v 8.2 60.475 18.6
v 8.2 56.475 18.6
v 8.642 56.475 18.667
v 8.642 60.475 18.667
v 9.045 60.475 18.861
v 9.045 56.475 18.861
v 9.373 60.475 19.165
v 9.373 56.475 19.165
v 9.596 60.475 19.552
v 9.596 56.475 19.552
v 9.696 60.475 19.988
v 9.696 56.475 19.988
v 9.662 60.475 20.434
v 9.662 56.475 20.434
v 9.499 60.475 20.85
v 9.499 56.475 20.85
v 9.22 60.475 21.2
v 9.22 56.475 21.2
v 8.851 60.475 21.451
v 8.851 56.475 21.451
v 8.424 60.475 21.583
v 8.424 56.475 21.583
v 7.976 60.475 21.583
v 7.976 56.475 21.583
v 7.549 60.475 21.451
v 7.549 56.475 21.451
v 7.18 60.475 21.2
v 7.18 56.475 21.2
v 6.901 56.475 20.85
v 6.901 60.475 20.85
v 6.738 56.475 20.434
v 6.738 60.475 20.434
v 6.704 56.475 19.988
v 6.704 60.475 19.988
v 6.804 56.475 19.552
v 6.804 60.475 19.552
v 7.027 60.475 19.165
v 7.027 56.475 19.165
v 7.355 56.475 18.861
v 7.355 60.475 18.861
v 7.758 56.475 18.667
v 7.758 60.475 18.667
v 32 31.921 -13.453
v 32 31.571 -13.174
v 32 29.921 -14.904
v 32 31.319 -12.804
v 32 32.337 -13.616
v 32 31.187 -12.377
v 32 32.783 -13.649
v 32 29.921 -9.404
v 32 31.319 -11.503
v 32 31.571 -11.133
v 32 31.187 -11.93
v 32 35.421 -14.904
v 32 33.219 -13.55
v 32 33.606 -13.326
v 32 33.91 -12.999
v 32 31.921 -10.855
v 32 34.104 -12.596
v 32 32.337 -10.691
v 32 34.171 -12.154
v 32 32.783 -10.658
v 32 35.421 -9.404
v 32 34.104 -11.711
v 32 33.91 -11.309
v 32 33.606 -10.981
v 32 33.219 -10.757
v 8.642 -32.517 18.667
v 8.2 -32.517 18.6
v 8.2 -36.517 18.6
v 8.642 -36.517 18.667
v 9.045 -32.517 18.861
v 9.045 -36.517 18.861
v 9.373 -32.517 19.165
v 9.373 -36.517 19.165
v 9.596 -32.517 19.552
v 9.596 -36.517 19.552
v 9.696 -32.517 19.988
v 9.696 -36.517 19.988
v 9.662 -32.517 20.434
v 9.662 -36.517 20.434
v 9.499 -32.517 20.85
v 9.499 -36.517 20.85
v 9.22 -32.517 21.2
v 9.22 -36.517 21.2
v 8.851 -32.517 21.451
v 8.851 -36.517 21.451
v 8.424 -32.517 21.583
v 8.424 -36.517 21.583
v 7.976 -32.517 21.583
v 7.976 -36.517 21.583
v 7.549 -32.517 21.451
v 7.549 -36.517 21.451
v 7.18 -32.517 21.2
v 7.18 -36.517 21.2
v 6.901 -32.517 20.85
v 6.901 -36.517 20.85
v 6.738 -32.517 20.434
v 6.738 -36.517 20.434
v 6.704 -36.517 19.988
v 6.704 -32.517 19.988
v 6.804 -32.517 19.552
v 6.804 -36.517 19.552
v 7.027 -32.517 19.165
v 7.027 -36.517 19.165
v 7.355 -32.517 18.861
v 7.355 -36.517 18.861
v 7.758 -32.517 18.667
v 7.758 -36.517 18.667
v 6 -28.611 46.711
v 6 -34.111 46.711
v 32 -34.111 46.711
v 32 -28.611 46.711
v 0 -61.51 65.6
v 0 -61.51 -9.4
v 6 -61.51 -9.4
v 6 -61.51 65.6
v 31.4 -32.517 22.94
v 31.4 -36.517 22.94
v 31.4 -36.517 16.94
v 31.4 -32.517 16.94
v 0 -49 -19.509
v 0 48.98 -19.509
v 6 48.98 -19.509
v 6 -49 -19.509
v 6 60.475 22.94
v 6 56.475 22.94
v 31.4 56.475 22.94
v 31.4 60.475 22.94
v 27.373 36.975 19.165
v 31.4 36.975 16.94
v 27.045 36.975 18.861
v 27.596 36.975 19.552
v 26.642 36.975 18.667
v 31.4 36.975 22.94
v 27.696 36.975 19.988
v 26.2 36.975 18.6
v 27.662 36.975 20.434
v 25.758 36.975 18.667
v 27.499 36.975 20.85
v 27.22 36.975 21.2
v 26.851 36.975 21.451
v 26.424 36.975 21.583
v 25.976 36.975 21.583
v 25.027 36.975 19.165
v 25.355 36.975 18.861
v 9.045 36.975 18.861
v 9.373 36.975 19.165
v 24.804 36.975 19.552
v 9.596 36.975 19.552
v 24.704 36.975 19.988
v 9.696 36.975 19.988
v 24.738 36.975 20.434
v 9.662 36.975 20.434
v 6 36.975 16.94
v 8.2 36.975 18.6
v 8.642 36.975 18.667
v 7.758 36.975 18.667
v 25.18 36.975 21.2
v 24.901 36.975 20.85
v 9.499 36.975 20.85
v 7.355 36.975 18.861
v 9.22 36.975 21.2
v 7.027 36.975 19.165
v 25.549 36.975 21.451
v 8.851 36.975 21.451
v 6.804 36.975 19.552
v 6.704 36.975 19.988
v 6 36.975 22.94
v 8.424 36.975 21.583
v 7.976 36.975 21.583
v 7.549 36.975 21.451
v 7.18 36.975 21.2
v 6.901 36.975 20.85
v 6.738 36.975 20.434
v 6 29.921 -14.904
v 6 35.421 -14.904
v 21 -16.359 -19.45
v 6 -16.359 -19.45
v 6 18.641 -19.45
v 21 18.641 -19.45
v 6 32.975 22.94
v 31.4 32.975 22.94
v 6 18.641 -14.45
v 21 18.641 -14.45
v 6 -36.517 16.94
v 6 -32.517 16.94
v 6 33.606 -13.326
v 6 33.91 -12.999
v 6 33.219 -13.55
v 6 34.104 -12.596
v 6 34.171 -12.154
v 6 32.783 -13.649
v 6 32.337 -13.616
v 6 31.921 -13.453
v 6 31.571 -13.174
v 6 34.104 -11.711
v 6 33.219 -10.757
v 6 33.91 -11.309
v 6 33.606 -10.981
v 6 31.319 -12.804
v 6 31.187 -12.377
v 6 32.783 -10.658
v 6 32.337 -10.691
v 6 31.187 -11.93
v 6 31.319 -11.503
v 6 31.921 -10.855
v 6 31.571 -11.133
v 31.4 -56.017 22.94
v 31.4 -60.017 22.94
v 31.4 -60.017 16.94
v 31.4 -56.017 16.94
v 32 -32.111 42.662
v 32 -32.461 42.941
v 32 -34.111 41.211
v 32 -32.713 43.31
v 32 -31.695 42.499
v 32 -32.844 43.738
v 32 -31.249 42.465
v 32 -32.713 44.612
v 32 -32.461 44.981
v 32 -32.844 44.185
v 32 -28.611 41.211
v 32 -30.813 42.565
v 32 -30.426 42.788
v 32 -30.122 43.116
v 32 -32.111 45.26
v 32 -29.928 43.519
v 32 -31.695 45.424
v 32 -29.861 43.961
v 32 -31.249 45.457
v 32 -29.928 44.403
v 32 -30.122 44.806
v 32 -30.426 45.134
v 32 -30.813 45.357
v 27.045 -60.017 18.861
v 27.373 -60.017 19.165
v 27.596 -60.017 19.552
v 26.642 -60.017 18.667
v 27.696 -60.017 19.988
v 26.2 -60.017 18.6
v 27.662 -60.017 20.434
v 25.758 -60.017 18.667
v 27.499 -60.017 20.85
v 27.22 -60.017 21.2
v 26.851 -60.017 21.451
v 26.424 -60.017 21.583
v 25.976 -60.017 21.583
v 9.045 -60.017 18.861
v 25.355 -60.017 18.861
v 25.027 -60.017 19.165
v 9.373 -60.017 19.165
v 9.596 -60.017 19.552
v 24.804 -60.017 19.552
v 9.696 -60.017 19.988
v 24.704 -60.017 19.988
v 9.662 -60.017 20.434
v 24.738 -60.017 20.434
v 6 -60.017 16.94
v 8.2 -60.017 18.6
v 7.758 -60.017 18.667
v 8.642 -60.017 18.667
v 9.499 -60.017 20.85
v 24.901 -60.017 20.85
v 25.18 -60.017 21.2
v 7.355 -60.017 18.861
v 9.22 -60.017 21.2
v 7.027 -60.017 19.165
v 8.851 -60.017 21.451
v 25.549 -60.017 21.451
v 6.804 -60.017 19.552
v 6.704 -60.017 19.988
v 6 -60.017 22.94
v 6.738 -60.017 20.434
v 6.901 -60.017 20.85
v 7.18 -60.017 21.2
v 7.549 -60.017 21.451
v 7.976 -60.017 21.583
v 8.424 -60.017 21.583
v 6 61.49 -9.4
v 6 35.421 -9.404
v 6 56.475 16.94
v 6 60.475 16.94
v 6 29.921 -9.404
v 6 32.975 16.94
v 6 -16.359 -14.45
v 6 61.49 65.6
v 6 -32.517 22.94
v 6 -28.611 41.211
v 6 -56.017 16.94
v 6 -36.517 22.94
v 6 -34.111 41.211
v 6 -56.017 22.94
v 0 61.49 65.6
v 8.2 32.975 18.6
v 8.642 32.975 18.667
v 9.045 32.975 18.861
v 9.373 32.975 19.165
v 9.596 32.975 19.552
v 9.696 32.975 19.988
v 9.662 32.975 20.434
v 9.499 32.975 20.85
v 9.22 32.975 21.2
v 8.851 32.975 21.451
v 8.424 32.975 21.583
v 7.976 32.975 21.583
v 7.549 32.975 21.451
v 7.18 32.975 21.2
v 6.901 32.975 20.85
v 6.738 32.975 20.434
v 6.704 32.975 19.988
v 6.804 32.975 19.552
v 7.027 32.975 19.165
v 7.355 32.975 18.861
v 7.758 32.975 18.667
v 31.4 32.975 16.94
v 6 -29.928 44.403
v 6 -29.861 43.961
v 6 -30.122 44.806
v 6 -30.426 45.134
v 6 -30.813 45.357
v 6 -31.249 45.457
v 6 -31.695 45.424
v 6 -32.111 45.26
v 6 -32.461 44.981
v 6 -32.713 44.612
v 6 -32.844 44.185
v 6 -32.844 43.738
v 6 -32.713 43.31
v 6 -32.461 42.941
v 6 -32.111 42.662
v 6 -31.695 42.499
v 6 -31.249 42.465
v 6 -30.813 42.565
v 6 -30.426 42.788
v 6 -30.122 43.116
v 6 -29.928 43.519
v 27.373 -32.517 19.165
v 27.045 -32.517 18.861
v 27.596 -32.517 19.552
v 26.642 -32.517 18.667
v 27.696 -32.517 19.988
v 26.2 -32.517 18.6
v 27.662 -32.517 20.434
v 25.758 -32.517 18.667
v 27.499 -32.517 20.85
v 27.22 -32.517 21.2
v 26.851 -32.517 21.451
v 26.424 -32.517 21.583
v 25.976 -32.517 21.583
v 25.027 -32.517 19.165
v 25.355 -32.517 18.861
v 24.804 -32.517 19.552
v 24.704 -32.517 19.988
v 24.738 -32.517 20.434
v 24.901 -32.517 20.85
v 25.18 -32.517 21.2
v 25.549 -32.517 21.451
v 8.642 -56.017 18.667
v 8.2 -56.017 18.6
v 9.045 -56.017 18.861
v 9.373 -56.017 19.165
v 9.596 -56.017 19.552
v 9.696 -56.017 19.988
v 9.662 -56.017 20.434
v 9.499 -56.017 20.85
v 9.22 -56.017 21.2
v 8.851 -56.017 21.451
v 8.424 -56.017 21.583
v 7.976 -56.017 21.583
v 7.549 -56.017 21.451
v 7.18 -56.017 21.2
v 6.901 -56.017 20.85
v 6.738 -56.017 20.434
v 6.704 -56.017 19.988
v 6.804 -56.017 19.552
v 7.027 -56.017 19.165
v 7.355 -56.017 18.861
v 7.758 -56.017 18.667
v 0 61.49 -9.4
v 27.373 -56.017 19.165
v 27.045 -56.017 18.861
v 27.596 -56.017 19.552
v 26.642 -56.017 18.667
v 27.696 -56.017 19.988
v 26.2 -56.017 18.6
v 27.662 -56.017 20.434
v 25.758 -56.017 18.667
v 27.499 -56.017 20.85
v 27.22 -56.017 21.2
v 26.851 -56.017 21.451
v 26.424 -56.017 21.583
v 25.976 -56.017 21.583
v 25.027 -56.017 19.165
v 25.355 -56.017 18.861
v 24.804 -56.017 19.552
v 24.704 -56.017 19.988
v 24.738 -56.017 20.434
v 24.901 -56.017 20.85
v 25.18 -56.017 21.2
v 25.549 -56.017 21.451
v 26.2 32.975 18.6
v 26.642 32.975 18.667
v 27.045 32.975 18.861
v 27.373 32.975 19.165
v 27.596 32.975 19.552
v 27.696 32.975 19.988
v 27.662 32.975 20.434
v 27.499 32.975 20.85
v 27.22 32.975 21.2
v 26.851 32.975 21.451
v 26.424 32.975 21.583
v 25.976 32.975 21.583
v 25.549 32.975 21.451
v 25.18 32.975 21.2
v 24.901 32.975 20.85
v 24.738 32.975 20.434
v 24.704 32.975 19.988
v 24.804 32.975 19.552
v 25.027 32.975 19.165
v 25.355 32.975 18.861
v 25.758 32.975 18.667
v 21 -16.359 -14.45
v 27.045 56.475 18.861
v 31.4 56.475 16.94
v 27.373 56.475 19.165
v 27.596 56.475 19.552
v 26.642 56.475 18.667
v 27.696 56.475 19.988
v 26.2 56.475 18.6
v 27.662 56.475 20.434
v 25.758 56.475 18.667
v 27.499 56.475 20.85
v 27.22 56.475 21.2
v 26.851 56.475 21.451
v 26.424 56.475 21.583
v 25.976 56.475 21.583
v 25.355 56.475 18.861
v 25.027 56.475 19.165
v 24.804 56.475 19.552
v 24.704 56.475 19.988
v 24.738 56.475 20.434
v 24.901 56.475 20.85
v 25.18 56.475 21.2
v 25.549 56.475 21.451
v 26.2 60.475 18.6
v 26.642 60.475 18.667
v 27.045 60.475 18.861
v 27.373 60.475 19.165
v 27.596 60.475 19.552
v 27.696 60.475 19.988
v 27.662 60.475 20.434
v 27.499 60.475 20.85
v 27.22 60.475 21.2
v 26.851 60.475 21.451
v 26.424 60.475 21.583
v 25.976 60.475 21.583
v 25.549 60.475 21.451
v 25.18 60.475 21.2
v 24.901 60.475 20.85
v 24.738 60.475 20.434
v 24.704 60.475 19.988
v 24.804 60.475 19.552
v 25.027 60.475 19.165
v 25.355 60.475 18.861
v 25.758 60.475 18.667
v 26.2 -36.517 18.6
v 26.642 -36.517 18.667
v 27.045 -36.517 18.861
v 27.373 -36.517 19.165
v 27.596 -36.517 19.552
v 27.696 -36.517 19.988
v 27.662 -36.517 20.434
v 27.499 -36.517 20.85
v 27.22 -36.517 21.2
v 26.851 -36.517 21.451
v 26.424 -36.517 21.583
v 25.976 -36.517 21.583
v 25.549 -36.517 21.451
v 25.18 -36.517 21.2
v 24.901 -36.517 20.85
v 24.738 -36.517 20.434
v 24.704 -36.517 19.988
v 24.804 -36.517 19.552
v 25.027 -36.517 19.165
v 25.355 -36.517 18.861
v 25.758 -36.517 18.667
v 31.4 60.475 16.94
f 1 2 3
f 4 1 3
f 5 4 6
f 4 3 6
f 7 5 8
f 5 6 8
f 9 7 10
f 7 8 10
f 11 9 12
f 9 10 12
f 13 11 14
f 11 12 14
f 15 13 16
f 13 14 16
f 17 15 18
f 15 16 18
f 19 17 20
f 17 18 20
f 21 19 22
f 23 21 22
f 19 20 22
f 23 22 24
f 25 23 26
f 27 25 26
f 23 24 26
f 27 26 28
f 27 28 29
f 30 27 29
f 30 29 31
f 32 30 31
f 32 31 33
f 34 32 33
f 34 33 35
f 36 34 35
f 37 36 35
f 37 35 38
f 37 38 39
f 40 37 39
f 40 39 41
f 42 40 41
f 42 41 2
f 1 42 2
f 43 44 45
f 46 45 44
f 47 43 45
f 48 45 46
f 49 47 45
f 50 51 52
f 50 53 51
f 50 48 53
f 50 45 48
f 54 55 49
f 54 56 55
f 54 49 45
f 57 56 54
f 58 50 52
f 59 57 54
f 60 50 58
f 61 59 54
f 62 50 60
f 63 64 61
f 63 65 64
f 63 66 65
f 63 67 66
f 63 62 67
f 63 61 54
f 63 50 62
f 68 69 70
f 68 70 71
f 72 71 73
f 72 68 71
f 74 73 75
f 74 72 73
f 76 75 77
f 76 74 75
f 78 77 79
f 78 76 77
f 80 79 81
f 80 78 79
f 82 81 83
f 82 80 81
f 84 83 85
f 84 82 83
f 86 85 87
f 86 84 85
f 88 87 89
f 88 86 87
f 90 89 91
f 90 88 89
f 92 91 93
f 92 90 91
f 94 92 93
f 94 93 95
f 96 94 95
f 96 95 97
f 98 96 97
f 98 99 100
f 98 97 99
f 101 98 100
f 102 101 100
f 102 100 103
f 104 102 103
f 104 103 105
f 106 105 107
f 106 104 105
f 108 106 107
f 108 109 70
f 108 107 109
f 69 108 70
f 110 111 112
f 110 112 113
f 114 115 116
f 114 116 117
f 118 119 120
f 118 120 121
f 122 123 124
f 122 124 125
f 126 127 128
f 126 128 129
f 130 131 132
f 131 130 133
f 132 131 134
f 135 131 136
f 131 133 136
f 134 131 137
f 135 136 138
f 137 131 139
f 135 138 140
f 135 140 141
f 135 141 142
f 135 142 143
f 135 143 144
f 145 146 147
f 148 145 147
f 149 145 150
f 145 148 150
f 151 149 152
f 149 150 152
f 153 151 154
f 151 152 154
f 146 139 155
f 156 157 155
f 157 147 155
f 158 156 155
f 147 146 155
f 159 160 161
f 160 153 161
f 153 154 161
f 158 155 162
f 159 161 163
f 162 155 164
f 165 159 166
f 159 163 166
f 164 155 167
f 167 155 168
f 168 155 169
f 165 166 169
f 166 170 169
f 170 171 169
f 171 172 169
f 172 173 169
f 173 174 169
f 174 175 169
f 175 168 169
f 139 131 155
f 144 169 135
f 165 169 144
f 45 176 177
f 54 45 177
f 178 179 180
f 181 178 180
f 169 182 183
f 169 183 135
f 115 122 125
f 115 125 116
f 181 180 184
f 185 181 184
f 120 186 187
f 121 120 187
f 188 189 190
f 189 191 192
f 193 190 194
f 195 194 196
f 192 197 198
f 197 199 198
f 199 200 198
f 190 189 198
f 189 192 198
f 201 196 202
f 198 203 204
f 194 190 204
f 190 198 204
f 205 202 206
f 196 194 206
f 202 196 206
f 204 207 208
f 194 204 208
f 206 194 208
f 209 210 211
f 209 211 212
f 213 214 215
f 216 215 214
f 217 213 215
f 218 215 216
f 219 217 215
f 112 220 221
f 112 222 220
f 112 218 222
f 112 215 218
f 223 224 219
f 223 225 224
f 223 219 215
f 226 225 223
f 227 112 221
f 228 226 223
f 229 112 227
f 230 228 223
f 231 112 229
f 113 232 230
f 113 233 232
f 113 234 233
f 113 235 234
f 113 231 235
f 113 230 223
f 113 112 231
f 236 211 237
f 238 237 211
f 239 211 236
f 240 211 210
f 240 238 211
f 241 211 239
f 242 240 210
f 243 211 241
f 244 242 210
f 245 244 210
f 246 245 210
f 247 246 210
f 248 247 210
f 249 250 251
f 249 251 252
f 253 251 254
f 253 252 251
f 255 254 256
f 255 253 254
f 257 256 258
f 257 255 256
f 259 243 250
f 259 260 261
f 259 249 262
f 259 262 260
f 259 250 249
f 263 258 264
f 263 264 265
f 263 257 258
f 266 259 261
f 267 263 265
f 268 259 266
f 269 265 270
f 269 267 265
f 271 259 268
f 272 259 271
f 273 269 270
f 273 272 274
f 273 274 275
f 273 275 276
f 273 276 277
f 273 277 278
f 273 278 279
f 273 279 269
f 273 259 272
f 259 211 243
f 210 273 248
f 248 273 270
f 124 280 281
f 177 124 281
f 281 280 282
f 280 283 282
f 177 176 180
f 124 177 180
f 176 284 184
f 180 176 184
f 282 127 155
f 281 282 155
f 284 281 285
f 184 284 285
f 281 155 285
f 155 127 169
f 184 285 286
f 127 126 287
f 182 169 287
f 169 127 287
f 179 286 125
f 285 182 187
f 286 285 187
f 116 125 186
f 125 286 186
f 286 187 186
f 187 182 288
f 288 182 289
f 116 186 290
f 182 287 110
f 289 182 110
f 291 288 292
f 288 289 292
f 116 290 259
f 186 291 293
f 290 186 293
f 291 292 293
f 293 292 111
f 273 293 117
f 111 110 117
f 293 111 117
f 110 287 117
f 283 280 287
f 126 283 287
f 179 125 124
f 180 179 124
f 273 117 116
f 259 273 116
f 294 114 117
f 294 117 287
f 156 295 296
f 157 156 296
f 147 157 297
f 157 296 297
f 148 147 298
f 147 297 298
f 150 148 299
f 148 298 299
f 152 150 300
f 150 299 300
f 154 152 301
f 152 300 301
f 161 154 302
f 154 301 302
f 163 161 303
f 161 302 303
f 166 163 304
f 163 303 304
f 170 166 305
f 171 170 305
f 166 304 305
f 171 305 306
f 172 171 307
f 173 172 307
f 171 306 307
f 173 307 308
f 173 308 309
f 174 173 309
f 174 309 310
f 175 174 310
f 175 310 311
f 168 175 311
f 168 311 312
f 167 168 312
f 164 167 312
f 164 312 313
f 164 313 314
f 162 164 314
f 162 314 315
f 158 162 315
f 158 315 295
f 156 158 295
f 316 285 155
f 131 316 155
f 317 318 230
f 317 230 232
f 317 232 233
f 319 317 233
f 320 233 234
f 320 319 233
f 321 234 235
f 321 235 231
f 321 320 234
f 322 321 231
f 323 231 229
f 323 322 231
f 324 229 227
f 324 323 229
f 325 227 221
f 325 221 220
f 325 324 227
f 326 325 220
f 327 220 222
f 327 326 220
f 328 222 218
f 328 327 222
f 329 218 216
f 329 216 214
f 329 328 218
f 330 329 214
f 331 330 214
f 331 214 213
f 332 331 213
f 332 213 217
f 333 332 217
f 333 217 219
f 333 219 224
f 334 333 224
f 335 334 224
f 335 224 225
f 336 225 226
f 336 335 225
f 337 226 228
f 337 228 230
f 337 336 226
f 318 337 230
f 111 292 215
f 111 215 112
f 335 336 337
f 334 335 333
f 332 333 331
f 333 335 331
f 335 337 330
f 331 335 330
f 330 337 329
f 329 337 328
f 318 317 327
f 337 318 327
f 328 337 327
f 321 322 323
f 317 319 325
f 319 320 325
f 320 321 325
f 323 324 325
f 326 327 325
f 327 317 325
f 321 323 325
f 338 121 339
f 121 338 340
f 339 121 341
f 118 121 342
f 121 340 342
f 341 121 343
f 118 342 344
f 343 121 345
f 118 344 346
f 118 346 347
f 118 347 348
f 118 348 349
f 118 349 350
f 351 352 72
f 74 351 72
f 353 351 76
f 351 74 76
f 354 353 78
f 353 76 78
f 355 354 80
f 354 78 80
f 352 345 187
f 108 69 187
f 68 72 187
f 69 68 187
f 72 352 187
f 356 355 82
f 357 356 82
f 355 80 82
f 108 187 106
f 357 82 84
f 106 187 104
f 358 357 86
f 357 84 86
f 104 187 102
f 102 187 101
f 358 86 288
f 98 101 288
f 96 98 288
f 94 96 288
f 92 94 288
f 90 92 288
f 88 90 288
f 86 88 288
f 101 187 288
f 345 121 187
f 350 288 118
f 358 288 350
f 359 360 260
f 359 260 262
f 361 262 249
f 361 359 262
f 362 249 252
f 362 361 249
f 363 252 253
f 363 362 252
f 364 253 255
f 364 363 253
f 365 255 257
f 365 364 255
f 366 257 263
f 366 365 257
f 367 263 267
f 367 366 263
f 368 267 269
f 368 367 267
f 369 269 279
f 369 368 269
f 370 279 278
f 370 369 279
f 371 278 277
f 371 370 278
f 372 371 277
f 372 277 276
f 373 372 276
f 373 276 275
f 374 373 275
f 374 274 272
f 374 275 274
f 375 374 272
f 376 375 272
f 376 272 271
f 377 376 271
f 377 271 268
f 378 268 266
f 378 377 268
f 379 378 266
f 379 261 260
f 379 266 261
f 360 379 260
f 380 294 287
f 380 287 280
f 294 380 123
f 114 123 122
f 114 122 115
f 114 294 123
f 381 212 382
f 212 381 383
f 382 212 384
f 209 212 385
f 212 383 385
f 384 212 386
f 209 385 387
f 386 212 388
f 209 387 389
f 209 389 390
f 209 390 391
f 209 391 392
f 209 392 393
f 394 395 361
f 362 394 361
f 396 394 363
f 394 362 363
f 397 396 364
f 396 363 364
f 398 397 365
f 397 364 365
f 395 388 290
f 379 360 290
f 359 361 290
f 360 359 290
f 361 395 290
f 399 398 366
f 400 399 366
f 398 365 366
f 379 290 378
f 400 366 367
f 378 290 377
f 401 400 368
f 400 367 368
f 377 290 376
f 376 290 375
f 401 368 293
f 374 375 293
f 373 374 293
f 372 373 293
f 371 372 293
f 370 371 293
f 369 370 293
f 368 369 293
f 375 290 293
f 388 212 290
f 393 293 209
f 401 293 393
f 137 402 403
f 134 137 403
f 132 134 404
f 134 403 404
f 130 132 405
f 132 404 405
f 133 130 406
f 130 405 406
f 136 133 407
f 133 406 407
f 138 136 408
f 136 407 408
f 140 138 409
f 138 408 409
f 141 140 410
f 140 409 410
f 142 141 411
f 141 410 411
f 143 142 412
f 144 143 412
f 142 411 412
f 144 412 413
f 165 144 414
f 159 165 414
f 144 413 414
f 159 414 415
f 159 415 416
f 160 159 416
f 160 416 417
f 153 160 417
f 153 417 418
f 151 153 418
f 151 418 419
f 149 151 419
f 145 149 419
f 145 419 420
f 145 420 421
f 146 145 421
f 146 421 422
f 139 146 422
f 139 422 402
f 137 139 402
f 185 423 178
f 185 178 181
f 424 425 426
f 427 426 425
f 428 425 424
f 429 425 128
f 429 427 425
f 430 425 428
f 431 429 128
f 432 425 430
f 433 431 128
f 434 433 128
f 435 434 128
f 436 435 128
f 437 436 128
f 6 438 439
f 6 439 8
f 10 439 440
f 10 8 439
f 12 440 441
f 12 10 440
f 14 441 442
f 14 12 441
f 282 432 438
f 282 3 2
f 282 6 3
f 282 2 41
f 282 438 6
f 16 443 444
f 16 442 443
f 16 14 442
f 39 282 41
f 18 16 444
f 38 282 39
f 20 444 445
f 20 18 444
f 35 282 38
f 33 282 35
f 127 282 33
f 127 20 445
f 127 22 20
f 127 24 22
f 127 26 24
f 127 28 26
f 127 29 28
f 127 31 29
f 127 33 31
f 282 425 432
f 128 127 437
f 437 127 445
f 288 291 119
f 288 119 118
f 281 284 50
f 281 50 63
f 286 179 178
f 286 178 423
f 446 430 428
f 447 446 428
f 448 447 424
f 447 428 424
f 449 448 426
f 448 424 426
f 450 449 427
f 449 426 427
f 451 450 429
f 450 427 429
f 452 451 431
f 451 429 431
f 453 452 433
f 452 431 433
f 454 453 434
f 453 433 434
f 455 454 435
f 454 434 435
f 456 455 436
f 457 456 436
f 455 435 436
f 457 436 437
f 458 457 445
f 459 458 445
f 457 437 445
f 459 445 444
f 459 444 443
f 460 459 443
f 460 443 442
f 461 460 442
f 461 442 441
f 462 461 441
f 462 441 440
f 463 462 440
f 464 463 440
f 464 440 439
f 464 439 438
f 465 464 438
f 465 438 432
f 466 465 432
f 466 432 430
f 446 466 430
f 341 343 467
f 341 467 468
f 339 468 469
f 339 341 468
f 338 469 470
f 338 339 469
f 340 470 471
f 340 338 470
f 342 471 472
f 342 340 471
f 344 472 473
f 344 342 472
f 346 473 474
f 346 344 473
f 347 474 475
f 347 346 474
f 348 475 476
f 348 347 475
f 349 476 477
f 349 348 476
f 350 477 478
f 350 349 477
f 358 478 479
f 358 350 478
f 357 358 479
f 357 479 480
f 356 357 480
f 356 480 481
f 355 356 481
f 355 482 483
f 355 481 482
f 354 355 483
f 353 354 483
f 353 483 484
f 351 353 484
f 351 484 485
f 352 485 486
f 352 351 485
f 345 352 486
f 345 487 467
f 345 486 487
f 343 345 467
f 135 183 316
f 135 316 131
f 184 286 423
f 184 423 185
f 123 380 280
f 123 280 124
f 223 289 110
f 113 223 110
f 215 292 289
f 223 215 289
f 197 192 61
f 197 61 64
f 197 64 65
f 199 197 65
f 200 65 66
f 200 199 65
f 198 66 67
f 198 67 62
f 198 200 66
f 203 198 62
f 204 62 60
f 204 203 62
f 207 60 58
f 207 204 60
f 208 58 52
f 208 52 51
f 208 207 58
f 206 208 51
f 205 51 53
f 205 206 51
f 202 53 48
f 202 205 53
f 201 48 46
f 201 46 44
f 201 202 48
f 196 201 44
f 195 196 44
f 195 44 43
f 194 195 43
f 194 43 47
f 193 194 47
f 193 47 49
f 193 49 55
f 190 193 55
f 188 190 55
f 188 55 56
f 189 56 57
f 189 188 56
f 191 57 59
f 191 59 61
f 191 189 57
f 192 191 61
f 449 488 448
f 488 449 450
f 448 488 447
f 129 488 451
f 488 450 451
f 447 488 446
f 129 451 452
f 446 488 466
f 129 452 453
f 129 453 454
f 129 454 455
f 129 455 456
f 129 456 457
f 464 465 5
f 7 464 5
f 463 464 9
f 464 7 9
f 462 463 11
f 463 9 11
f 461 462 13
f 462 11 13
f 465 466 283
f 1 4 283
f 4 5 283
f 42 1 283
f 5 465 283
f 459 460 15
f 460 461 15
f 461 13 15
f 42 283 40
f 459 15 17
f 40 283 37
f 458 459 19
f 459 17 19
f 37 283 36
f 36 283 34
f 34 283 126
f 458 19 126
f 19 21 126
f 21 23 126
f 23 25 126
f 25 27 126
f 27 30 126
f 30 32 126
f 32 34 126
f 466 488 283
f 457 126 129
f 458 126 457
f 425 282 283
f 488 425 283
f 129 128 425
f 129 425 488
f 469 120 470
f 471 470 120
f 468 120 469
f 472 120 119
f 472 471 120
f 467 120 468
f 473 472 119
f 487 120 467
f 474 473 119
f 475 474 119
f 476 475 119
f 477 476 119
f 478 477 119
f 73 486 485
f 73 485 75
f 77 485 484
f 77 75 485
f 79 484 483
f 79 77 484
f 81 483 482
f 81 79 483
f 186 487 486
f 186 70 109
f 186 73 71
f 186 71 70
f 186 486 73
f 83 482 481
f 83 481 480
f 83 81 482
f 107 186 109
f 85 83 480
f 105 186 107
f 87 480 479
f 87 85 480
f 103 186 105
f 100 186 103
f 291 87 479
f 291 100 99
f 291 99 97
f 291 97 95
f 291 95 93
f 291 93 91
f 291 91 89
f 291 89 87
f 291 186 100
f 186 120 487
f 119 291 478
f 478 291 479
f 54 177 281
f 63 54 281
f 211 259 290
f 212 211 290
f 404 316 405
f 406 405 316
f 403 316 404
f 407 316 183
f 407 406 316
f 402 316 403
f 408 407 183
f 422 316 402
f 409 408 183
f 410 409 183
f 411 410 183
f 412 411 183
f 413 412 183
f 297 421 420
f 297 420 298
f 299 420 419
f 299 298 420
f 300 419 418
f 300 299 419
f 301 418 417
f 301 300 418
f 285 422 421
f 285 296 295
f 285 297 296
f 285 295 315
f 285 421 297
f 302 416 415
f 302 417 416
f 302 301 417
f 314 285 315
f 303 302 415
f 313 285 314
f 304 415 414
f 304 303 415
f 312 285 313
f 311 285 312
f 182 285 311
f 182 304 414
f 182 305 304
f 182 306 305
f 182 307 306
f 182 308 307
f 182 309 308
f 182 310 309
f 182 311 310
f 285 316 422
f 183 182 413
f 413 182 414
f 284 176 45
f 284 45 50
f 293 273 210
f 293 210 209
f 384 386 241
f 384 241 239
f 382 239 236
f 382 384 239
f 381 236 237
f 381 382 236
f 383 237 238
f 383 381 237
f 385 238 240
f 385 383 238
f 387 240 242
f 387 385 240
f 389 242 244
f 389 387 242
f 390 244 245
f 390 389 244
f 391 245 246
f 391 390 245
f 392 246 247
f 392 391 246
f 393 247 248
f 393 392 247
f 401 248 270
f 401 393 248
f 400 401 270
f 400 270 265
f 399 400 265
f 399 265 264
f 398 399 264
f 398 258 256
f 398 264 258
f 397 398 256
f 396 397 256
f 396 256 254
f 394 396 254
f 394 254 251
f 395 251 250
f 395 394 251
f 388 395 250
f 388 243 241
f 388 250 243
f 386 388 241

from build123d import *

# Parameters (mm, degrees)
PAD_DEPTH         = 6
SKETCH001_W       = 4
SKETCH001_H       = 6
PAD001_DEPTH      = 25.4
SKETCH002_R       = 1.5
POCKET_DEPTH      = 100
POCKET_DEPTH_BACK = 100
SKETCH003_W       = 35
SKETCH003_H       = 5
PAD002_DEPTH      = 15
SKETCH012_W       = 5.5
SKETCH012_H       = 5.5
SKETCH012_R       = 1.5
PAD010_DEPTH      = 26


with BuildPart() as part:
    # Sketch → Pad (new body)
    with BuildSketch(Plane.YZ):
        Polygon((-61.51, 65.6), (61.49, 65.6), (61.49, -9.4), (48.98, -19.508726), (-49, -19.508726), (-61.51, -9.4), align=None)
    extrude(amount=PAD_DEPTH)

    # Sketch001 (on Face8 of Pad) → Pad001 (join)
    with BuildSketch(Plane.YZ.offset(6)):
        with Locations((34.974674, 19.94)):
            Rectangle(SKETCH001_W, SKETCH001_H)
        with Locations((58.474674, 19.94)):
            Rectangle(SKETCH001_W, SKETCH001_H)
        with Locations((-34.517246, 19.94)):
            Rectangle(SKETCH001_W, SKETCH001_H)
        with Locations((-58.017246, 19.94)):
            Rectangle(SKETCH001_W, SKETCH001_H)
    extrude(amount=PAD001_DEPTH)

    # Sketch002 (on Face14 of Pad001) → Pocket (cut, two sides)
    with BuildSketch(Plane(origin=(0, 32.974674, 0), x_dir=(0, 0, -1), z_dir=(0, -1, 0))) as pocket_sk:
        with Locations((-20.1, 26.2)):
            Circle(SKETCH002_R)
        with Locations((-20.1, 8.2)):
            Circle(SKETCH002_R)
    extrude(amount=-POCKET_DEPTH, mode=Mode.SUBTRACT)
    extrude(pocket_sk.sketch, amount=POCKET_DEPTH_BACK, mode=Mode.SUBTRACT)

    # Sketch003 (on Face5 of Pocket) → Pad002 (join)
    with BuildSketch(Plane.YZ.offset(6)):
        with Locations((1.141409, -16.950097)):
            Rectangle(SKETCH003_W, SKETCH003_H)
    extrude(amount=PAD002_DEPTH)

    # Sketch012 (on Face5 of Pad002) → Pad010 (join)
    with BuildSketch(Plane.YZ.offset(6)):
        with Locations((-31.36108, 43.961174)):
            Rectangle(SKETCH012_W, SKETCH012_H)
        with Locations((-31.36108, 43.961174)):
            Circle(SKETCH012_R, mode=Mode.SUBTRACT)
        with Locations((32.670517, -12.15361)):
            Rectangle(SKETCH012_W, SKETCH012_H)
        with Locations((32.670517, -12.15361)):
            Circle(SKETCH012_R, mode=Mode.SUBTRACT)
    extrude(amount=PAD010_DEPTH)


solid = part.part
